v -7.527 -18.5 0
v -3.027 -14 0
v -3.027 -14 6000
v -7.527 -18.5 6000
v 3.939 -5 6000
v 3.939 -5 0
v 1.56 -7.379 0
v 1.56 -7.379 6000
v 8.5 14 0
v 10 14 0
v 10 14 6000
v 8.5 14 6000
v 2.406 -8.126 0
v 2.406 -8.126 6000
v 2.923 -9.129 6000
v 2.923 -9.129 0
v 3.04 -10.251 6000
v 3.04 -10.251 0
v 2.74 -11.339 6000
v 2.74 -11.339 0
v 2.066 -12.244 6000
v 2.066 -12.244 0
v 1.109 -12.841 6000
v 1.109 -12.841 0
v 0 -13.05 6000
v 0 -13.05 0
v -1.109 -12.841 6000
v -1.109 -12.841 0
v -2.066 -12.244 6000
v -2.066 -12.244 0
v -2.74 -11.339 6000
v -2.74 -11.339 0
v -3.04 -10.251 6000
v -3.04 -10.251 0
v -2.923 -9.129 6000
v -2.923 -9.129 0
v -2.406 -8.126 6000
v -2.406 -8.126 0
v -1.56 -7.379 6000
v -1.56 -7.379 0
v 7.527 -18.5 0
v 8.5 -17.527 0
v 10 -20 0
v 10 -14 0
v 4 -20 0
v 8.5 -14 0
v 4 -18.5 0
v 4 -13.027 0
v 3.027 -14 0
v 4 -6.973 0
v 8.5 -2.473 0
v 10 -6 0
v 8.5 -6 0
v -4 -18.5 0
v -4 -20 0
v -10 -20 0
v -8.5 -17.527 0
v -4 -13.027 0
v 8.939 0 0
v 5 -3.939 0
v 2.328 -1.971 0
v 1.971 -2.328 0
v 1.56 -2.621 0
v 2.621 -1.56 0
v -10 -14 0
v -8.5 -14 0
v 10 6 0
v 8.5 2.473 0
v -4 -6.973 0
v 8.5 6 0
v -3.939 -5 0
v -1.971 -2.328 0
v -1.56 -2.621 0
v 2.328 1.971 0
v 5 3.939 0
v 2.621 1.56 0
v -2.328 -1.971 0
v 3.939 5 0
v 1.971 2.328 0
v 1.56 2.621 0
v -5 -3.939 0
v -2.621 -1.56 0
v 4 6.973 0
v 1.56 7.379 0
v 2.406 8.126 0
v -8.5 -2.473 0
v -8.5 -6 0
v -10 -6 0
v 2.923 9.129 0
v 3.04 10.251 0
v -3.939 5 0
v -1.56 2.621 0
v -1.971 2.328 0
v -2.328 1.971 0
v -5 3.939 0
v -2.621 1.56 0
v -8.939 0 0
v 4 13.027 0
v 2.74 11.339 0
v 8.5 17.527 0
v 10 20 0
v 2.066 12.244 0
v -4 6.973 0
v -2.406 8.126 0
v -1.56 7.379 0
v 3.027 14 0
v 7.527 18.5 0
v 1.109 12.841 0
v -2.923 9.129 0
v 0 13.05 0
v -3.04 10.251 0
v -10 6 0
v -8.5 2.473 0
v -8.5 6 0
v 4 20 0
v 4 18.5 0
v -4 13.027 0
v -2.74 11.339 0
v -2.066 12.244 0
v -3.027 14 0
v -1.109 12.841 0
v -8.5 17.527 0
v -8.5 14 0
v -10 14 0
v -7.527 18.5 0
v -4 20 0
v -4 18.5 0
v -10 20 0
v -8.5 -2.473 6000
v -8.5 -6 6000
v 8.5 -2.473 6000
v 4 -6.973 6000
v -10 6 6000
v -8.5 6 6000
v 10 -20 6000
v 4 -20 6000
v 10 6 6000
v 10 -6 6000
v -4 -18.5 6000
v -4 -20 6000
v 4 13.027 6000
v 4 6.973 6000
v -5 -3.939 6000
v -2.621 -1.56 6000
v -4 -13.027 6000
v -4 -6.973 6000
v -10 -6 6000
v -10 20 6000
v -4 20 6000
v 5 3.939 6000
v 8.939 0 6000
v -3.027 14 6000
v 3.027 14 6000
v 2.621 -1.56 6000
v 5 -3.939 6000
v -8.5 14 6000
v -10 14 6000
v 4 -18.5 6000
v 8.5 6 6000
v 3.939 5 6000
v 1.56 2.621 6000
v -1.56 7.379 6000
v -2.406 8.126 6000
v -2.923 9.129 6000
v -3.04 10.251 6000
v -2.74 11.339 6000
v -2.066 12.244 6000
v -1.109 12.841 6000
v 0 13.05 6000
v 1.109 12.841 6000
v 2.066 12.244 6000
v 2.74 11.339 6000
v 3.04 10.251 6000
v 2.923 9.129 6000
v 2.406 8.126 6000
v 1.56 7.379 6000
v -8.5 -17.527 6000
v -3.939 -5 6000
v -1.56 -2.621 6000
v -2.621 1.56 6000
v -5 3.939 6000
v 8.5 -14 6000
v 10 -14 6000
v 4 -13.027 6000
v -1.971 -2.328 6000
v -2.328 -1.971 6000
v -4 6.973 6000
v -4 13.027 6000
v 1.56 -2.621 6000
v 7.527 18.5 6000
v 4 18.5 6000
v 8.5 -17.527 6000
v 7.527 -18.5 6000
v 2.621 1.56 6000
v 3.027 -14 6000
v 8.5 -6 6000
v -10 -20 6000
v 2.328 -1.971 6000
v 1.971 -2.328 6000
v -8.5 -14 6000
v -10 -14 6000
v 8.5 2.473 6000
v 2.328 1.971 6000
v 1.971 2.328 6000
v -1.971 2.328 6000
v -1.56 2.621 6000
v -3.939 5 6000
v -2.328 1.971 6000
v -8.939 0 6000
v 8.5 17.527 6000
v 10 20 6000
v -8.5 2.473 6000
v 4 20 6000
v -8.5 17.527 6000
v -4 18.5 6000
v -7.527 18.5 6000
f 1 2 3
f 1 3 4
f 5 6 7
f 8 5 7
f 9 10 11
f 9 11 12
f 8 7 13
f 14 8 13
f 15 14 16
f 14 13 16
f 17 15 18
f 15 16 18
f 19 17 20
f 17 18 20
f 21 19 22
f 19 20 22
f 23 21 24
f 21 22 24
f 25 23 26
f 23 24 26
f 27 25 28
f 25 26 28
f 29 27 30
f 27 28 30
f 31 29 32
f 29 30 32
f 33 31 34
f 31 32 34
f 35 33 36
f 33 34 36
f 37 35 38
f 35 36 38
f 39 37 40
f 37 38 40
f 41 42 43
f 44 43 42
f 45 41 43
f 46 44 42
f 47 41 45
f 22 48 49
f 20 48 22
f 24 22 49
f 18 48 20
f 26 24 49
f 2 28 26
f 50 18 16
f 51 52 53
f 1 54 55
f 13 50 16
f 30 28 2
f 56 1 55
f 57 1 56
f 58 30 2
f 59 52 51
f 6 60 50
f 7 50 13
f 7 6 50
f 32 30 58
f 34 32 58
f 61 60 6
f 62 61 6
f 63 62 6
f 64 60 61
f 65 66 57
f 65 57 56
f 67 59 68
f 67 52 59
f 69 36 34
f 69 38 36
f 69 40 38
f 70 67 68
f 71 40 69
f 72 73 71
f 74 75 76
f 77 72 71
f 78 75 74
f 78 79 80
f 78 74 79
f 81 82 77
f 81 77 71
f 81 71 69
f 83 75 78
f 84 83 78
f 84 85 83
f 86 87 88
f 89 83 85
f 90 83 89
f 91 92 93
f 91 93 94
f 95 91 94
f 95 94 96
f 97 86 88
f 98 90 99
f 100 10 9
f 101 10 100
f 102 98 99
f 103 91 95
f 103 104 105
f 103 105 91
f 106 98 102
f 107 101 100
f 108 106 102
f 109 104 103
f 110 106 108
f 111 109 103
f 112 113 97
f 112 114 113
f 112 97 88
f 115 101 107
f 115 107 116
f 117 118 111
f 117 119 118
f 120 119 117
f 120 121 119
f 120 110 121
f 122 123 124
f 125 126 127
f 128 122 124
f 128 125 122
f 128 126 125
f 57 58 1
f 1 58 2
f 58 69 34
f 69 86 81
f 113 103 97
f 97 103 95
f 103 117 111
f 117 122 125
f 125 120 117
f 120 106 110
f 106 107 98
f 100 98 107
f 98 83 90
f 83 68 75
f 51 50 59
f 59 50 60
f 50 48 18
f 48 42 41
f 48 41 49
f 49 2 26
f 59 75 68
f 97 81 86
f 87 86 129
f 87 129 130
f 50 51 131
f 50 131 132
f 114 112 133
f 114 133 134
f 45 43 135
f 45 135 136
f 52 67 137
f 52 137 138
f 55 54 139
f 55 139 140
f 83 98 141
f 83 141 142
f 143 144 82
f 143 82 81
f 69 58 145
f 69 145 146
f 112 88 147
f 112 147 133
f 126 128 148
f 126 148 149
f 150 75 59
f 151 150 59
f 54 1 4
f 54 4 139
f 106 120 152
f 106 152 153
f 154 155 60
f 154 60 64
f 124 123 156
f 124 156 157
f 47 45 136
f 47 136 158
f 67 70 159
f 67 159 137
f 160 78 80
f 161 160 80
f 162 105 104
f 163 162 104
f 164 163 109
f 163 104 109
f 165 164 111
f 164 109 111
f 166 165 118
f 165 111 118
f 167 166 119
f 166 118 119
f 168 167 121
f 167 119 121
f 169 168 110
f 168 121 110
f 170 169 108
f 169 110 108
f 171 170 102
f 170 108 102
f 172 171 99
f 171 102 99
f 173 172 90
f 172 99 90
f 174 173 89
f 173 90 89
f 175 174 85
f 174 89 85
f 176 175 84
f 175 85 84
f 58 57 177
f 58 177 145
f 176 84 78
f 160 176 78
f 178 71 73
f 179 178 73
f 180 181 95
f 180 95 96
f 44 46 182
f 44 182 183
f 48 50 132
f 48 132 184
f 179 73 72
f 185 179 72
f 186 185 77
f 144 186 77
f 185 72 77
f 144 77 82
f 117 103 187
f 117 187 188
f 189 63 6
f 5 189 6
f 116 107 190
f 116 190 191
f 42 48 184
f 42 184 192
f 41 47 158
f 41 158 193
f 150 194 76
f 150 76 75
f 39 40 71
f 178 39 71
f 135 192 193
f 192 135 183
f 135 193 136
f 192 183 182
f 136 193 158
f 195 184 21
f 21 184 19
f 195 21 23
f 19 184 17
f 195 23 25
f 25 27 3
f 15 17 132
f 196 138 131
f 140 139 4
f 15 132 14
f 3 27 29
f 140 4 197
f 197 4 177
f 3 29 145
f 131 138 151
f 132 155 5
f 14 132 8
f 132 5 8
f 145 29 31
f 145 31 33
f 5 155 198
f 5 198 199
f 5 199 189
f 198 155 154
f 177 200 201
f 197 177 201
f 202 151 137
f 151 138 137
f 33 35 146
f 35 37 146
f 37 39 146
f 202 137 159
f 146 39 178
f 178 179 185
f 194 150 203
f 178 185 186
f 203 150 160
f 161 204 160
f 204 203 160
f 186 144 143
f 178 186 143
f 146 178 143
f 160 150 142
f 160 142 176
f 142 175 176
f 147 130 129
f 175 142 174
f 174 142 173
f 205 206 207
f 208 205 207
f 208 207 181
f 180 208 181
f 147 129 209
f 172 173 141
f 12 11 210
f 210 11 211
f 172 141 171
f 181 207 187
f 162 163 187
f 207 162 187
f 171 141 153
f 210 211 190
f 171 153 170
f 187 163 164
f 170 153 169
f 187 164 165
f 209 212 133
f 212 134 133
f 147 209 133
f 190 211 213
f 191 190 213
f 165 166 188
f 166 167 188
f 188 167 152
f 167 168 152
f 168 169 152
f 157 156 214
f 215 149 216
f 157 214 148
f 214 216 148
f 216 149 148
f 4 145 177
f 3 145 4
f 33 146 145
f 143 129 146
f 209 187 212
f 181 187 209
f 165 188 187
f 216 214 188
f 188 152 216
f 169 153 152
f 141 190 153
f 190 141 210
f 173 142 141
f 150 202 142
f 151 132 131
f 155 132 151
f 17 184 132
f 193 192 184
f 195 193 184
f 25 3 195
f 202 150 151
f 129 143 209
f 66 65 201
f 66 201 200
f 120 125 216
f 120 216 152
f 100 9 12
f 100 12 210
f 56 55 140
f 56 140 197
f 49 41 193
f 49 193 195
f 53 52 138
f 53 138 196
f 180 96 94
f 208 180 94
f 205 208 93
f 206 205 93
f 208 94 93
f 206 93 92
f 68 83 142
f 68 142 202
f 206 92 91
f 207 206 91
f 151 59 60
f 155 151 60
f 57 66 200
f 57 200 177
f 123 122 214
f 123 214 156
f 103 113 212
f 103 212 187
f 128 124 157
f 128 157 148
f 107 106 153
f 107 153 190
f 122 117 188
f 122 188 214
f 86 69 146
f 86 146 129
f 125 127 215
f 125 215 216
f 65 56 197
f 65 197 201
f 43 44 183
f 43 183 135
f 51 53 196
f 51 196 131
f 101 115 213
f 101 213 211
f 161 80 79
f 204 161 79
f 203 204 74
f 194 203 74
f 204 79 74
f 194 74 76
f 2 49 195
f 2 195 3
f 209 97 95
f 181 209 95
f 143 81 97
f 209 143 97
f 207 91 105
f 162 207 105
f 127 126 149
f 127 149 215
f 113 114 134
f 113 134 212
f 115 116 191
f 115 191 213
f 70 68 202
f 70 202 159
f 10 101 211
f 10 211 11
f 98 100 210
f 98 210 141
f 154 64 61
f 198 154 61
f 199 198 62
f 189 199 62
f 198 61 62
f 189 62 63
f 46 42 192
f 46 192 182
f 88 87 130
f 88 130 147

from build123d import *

# Parameters (mm, degrees)
EXTRUS_O1_DEPTH = 6000


with BuildPart() as part:
    # Sketch1 → Extrusão1 (new body)
    with BuildSketch(Plane.XY):
        Polygon((-4, -18.5), (-4, -20), (-10, -20), (-10, -14), (-8.5, -14), (-8.5, -17.527218), (-4, -13.027218), (-4, -6.972782), (-8.5, -2.472782), (-8.5, -6), (-10, -6), (-10, 6), (-8.5, 6), (-8.5, 2.472782), (-4, 6.972782), (-4, 13.027218), (-8.5, 17.527218), (-8.5, 14), (-10, 14), (-10, 20), (-4, 20), (-4, 18.5), (-7.527218, 18.5), (-3.027218, 14), (3.027218, 14), (7.527218, 18.5), (4, 18.5), (4, 20), (10, 20), (10, 14), (8.5, 14), (8.5, 17.527218), (4, 13.027218), (4, 6.972782), (8.5, 2.472782), (8.5, 6), (10, 6), (10, -6), (8.5, -6), (8.5, -2.472782), (4, -6.972782), (4, -13.027218), (8.5, -17.527218), (8.5, -14), (10, -14), (10, -20), (4, -20), (4, -18.5), (7.527218, -18.5), (3.027218, -14), (-3.027218, -14), (-7.527218, -18.5), align=None)
        with BuildLine():
            Line((-3.93933851, -4.999999999), (-1.560125514, -2.620783714))
            ThreePointArc((-1.560125514, -2.620783714), (-2.156676048, -2.156676048), (-2.620783714, -1.560125514))
            Line((-2.620783714, -1.560125514), (-5.000000183, -3.939338694))
            Line((-5.000000183, -3.939338694), (-8.939340246, 0))
            Line((-8.939340246, 0), (-5.000000183, 3.939338694))
            Line((-5.000000183, 3.939338694), (-2.620783714, 1.560125514))
            ThreePointArc((-2.620783714, 1.560125514), (-2.156676048, 2.156676048), (-1.560125514, 2.620783714))
            Line((-1.560125514, 2.620783714), (-3.93933851, 4.999999999))
            Line((-3.93933851, 4.999999999), (-1.560122936, 7.379214746))
            ThreePointArc((-1.560122936, 7.379214746), (0, 13.050000275), (1.560122936, 7.379214746))
            Line((1.560122936, 7.379214746), (3.93933851, 4.999999999))
            Line((3.93933851, 4.999999999), (1.560125514, 2.620783714))
            ThreePointArc((1.560125514, 2.620783714), (2.156676048, 2.156676048), (2.620783714, 1.560125514))
            Line((2.620783714, 1.560125514), (5.000000183, 3.939338694))
            Line((5.000000183, 3.939338694), (8.939340246, 0))
            Line((8.939340246, 0), (5.000000183, -3.939338694))
            Line((5.000000183, -3.939338694), (2.620783714, -1.560125514))
            ThreePointArc((2.620783714, -1.560125514), (2.156676048, -2.156676048), (1.560125514, -2.620783714))
            Line((1.560125514, -2.620783714), (3.93933851, -4.999999999))
            Line((3.93933851, -4.999999999), (1.560122936, -7.379214746))
            ThreePointArc((1.560122936, -7.379214746), (0, -13.050000275), (-1.560122936, -7.379214746))
            Line((-1.560122936, -7.379214746), (-3.93933851, -4.999999999))
        make_face(mode=Mode.SUBTRACT)
    extrude(amount=EXTRUS_O1_DEPTH)


solid = part.part
